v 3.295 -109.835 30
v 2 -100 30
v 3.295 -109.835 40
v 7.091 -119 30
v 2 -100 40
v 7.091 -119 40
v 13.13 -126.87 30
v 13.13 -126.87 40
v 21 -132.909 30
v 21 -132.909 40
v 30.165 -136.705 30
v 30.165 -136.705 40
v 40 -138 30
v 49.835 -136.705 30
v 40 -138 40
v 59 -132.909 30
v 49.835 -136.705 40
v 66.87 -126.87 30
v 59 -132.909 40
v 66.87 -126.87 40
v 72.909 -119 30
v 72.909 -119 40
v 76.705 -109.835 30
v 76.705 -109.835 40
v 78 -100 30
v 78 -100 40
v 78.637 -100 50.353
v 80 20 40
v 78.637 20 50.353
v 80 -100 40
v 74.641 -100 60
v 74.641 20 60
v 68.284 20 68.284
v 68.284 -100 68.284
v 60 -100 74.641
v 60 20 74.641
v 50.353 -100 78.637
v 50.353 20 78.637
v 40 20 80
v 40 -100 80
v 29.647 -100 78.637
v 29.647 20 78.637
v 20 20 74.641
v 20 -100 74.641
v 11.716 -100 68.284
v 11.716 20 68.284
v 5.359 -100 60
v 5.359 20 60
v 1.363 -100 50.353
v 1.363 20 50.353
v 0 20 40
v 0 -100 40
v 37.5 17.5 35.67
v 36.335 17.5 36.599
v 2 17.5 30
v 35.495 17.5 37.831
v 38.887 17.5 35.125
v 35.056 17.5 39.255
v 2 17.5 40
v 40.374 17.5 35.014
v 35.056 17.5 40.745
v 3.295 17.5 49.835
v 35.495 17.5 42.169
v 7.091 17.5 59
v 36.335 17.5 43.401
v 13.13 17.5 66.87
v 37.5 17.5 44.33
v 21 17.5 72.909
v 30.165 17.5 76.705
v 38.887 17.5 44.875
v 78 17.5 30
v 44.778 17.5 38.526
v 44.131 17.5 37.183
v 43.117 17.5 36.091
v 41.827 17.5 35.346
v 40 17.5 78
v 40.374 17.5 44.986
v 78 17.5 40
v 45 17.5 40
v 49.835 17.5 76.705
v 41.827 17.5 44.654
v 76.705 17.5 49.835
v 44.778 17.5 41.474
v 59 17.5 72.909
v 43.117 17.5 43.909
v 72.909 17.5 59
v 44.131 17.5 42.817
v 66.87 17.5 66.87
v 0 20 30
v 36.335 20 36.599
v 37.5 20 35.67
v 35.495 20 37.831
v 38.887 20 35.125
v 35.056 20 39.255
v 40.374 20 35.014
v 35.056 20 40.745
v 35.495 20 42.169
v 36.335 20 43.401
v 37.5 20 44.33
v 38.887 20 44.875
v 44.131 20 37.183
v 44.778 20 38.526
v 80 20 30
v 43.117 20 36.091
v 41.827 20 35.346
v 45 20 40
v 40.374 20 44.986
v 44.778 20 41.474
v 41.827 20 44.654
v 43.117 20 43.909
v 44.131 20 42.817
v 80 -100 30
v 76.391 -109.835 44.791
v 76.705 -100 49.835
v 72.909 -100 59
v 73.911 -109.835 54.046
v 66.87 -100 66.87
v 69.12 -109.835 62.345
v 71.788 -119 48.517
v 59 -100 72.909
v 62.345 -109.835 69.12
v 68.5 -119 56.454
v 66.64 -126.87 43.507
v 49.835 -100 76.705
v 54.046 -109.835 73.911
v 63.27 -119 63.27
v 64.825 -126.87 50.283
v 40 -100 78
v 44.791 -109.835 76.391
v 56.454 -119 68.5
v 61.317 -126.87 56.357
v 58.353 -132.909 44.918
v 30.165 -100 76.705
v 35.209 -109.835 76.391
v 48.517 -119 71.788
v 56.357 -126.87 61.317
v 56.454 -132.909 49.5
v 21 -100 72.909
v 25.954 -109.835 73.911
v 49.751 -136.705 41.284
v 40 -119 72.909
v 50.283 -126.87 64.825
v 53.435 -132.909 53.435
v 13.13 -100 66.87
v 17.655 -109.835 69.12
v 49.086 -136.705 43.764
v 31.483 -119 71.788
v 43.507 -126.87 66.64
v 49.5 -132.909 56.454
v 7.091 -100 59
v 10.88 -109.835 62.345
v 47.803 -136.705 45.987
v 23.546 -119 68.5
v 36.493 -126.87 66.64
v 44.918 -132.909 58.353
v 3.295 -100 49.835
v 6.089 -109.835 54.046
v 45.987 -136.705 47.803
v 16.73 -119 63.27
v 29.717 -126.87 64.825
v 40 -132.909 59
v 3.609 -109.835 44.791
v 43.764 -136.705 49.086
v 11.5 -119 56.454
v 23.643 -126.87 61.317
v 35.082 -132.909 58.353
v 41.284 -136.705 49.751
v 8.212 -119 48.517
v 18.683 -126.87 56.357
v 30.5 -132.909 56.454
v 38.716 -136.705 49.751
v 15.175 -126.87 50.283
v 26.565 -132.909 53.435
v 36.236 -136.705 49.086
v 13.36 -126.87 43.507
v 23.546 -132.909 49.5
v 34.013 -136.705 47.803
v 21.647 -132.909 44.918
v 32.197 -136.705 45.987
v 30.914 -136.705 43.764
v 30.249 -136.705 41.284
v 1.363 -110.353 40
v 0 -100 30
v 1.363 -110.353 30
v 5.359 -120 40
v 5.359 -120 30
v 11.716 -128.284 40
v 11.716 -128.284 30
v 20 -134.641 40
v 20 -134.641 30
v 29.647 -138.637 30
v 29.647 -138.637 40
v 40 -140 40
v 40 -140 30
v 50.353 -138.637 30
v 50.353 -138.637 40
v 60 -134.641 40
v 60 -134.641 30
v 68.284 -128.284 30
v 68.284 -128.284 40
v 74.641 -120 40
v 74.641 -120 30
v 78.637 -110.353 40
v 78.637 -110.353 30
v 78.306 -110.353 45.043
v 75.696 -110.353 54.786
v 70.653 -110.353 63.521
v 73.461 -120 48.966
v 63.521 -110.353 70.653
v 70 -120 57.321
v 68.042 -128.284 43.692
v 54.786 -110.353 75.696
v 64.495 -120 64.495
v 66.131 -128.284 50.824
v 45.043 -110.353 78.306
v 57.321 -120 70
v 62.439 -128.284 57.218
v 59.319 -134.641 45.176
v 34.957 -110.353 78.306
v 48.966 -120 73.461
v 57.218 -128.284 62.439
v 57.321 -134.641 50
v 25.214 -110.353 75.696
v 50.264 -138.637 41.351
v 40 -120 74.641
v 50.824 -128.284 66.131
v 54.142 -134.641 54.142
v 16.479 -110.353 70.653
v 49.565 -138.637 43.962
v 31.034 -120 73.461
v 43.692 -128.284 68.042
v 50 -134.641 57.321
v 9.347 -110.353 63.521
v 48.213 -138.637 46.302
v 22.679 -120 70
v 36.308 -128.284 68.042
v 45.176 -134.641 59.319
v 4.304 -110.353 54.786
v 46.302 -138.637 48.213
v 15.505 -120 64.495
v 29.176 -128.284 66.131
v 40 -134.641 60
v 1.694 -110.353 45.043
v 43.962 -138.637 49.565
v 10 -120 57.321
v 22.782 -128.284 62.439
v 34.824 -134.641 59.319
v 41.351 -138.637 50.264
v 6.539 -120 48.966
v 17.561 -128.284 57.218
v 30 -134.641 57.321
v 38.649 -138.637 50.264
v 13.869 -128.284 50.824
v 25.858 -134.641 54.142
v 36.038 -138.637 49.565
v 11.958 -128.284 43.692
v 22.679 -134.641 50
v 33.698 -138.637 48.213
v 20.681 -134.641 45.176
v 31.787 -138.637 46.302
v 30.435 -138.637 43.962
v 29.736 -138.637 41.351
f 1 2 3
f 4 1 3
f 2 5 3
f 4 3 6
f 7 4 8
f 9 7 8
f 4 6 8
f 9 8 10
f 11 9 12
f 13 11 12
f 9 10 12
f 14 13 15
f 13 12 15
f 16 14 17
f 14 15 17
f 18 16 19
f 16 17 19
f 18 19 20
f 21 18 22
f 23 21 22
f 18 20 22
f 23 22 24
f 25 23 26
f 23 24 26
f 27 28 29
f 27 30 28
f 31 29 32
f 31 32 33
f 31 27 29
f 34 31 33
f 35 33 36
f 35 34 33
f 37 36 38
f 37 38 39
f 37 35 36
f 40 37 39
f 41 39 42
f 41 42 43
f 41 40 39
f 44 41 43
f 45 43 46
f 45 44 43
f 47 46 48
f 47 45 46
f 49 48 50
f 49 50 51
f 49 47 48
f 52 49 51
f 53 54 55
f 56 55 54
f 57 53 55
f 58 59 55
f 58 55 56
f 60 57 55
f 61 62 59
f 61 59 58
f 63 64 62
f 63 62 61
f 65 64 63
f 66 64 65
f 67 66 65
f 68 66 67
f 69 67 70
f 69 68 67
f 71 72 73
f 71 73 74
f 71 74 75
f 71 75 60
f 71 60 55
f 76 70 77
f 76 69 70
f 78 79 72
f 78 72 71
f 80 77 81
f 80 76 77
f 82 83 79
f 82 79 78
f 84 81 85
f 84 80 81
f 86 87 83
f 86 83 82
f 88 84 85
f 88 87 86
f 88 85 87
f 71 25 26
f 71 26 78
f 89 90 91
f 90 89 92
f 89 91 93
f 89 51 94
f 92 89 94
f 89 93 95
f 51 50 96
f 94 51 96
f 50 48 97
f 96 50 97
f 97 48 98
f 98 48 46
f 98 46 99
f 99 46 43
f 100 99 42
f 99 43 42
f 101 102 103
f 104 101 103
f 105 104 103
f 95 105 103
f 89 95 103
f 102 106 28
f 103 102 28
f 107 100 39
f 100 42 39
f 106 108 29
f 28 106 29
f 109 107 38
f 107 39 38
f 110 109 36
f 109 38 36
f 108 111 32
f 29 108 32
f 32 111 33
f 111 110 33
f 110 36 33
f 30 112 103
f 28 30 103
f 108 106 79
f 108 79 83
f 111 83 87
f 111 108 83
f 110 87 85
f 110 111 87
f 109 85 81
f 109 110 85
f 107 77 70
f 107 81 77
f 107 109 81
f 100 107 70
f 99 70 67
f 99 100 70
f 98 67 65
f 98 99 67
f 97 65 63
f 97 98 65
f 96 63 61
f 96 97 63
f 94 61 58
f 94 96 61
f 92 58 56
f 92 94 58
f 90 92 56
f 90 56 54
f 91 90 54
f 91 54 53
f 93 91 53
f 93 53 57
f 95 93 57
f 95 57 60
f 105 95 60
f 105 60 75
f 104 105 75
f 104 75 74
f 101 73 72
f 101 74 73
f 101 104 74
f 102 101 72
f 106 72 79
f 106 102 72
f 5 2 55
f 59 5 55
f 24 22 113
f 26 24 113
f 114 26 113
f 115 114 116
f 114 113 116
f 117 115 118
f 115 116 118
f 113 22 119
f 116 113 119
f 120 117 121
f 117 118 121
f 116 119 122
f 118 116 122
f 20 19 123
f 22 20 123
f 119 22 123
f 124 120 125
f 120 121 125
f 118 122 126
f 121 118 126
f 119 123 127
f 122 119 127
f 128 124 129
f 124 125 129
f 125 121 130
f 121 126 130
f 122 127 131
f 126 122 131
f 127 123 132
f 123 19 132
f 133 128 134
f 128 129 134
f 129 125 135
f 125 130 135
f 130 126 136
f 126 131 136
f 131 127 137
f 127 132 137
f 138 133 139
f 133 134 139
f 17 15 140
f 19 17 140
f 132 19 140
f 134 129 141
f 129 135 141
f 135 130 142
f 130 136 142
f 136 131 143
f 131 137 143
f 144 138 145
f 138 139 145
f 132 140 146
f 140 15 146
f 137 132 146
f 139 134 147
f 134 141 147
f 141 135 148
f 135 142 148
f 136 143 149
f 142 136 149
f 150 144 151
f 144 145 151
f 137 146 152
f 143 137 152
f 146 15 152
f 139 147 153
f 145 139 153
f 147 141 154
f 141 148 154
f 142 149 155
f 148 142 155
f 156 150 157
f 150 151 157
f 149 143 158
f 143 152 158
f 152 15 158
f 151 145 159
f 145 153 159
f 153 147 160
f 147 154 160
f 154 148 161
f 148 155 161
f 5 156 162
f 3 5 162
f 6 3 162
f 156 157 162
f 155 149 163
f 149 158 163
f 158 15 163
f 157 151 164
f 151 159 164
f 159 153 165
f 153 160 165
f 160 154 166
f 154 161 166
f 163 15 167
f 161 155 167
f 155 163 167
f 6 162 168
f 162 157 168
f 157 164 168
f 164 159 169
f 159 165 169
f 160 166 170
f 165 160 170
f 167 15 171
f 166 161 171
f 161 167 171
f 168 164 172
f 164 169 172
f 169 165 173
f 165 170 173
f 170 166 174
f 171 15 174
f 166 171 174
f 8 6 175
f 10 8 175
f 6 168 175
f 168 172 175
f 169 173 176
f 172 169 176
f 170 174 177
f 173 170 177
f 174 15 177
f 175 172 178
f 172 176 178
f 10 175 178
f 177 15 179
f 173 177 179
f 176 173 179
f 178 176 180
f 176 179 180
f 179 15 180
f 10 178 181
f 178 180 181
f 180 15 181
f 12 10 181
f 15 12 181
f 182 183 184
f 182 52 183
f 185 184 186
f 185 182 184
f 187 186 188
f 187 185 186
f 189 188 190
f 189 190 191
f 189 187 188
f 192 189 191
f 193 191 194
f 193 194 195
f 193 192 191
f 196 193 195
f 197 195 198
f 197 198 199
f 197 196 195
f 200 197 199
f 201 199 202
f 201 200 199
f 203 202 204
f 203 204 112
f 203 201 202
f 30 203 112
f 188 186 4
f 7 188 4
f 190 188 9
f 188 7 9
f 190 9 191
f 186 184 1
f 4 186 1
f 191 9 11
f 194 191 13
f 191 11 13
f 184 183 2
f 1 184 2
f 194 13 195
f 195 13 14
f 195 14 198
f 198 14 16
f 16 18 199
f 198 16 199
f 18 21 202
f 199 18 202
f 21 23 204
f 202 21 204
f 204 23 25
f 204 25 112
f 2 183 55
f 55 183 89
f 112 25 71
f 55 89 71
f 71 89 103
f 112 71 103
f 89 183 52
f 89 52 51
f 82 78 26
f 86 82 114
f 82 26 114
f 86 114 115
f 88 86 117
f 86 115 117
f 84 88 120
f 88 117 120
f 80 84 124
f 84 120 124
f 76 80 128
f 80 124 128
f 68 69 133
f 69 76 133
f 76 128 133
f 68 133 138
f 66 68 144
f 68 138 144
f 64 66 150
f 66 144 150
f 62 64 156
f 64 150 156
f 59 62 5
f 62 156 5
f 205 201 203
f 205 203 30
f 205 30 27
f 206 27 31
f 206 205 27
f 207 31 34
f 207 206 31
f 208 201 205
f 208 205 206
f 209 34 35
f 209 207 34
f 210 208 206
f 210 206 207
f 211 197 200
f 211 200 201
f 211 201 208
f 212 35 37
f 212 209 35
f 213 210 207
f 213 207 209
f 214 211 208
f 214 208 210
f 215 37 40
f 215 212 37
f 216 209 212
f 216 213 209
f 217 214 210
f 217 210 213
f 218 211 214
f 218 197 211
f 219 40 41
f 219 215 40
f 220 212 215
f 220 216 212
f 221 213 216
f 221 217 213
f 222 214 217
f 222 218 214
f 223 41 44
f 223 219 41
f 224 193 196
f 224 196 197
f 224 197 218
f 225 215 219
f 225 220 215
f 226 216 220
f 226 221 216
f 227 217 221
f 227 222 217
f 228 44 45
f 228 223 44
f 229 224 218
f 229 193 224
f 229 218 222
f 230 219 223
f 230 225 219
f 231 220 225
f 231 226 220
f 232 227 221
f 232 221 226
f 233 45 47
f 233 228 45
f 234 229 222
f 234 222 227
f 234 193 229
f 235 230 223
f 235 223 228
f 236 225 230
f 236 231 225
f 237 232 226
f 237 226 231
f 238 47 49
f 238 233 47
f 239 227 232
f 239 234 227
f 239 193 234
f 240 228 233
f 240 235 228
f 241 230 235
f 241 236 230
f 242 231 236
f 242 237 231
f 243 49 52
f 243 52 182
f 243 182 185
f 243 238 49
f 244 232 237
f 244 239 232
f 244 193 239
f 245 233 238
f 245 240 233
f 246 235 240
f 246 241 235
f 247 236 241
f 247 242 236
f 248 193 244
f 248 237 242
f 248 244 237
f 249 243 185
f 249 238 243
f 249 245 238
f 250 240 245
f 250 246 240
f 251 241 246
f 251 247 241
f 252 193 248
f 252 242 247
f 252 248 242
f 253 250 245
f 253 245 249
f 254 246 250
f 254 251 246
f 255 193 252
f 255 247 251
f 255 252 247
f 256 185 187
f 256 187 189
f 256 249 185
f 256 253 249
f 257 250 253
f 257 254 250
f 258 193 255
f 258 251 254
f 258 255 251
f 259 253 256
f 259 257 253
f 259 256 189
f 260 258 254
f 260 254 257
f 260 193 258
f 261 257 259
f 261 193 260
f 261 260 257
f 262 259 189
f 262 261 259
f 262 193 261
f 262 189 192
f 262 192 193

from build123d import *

# Parameters (mm, degrees)
CYLINDER003_W     = 38
CYLINDER003_H     = 120
CYLINDER003_ANGLE = 180
CYLINDER_W        = 40
CYLINDER_H        = 120
CYLINDER_ANGLE    = 180
CYLINDER002_W     = 38
CYLINDER002_H     = 10
CYLINDER002_ANGLE = 180
CYLINDER001_W     = 40
CYLINDER001_H     = 10
CYLINDER001_ANGLE = 180
CYLINDER004_W     = 40
CYLINDER004_H     = 120
CYLINDER004_ANGLE = 180
SPHERE001_ANGLE   = 180
SPHERE_ANGLE      = 180
CYLINDER006_R     = 5
CYLINDER006_DEPTH = 17
CYLINDER005_W     = 38
CYLINDER005_H     = 2.5
CYLINDER005_ANGLE = 180
BOX_W             = 76
BOX_H             = 2.5
BOX_DEPTH         = 10
BOX002_W          = 76
BOX002_H          = 120
BOX002_DEPTH      = 10
BOX001_W          = 80
BOX001_H          = 120
BOX001_DEPTH      = 10


with BuildPart() as cilindro_superior_menor:
    # Cylinder003 → Cylinder003 (revolve)
    with BuildSketch(Plane(origin=(40, 20, 40), x_dir=(1, 0, 0), z_dir=(0, 0, -1))):
        with Locations((19, 60)):
            Rectangle(CYLINDER003_W, CYLINDER003_H)
    revolve(axis=Axis((40, 20, 40), (0, -1, 0)), revolution_arc=CYLINDER003_ANGLE)


with BuildPart() as techo:
    # Cylinder → Cylinder (revolve)
    with BuildSketch(Plane(origin=(40, 20, 40), x_dir=(1, 0, 0), z_dir=(0, 0, -1))):
        with Locations((20, 60)):
            Rectangle(CYLINDER_W, CYLINDER_H)
    revolve(axis=Axis((40, 20, 40), (0, -1, 0)), revolution_arc=CYLINDER_ANGLE)

    # Cut001: cut Cilindro superior menor
    add(cilindro_superior_menor.part, mode=Mode.SUBTRACT)


with BuildPart() as cilindro_menor:
    # Cylinder002 → Cylinder002 (revolve)
    with BuildSketch(Plane(origin=(40, -100, 30), x_dir=(-1, 0, 0), z_dir=(0, 1, 0))):
        with Locations((19, 5)):
            Rectangle(CYLINDER002_W, CYLINDER002_H)
    revolve(axis=Axis((40, -100, 30), (0, 0, 1)), revolution_arc=CYLINDER002_ANGLE)


with BuildPart() as borde_de_cupula:
    # Cylinder001 → Cylinder001 (revolve)
    with BuildSketch(Plane(origin=(40, -100, 30), x_dir=(-1, 0, 0), z_dir=(0, 1, 0))):
        with Locations((20, 5)):
            Rectangle(CYLINDER001_W, CYLINDER001_H)
    revolve(axis=Axis((40, -100, 30), (0, 0, 1)), revolution_arc=CYLINDER001_ANGLE)

    # Cut003: cut Cilindro menor
    add(cilindro_menor.part, mode=Mode.SUBTRACT)


with BuildPart() as cylinder004:
    # Cylinder004 → Cylinder004 (revolve)
    with BuildSketch(Plane(origin=(40, 20, 40), x_dir=(1, 0, 0), z_dir=(0, 0, -1))):
        with Locations((20, 60)):
            Rectangle(CYLINDER004_W, CYLINDER004_H)
    revolve(axis=Axis((40, 20, 40), (0, -1, 0)), revolution_arc=CYLINDER004_ANGLE)


with BuildPart() as esfera_menor:
    # Sphere001 → Sphere001 (revolve)
    with BuildSketch(Plane(origin=(40, -100, 40), x_dir=(1, 0, 0), z_dir=(0, 0, -1))):
        with BuildLine():
            ThreePointArc((0, -38), (38, 0), (0, 38))
            Line((0, 38), (0, -38))
        make_face()
    revolve(axis=Axis((40, -100, 40), (0, -1, 0)), revolution_arc=SPHERE001_ANGLE)


with BuildPart() as cupula_cortada:
    # Sphere → Sphere (revolve)
    with BuildSketch(Plane(origin=(40, -100, 40), x_dir=(1, 0, 0), z_dir=(0, 0, -1))):
        with BuildLine():
            ThreePointArc((0, -40), (40, 0), (0, 40))
            Line((0, 40), (0, -40))
        make_face()
    revolve(axis=Axis((40, -100, 40), (0, -1, 0)), revolution_arc=SPHERE_ANGLE)

    # Cut002: cut Esfera menor
    add(esfera_menor.part, mode=Mode.SUBTRACT)

    # Cut004: cut Cylinder004
    add(cylinder004.part, mode=Mode.SUBTRACT)


with BuildPart() as agujero:
    # Cylinder006 → Cylinder006 (new body)
    with BuildSketch(Plane(origin=(40, 24, 40), x_dir=(1, 0, 0), z_dir=(0, -1, 0))):
        Circle(CYLINDER006_R)
    extrude(amount=CYLINDER006_DEPTH)


with BuildPart() as soporte_para_superior:
    # Cylinder005 → Cylinder005 (revolve)
    with BuildSketch(Plane(origin=(40, 17.5, 40), x_dir=(-1, 0, 0), z_dir=(0, 0, -1))):
        with Locations((19, 1.25)):
            Rectangle(CYLINDER005_W, CYLINDER005_H)
    revolve(axis=Axis((40, 17.5, 40), (0, 1, 0)), revolution_arc=CYLINDER005_ANGLE)


with BuildPart() as soporte_con_agujero:
    # Box → Box (new body)
    with BuildSketch(Plane(origin=(2, 17.5, 30), x_dir=(1, 0, 0), z_dir=(0, 0, 1))):
        with Locations((38, 1.25)):
            Rectangle(BOX_W, BOX_H)
    extrude(amount=BOX_DEPTH)

    # Fusion: union Soporte para superior
    add(soporte_para_superior.part)

    # Cut005: cut Agujero
    add(agujero.part, mode=Mode.SUBTRACT)


with BuildPart() as rectangulo_menor:
    # Box002 → Box002 (new body)
    with BuildSketch(Plane(origin=(2, -100, 30), x_dir=(1, 0, 0), z_dir=(0, 0, 1))):
        with Locations((38, 60)):
            Rectangle(BOX002_W, BOX002_H)
    extrude(amount=BOX002_DEPTH)


with BuildPart() as cabeza_de_lampara_terminada:
    # Box001 → Box001 (new body)
    with BuildSketch(Plane(origin=(0, -100, 30), x_dir=(1, 0, 0), z_dir=(0, 0, 1))):
        with Locations((40, 60)):
            Rectangle(BOX001_W, BOX001_H)
    extrude(amount=BOX001_DEPTH)

    # Cut: cut Rectangulo menor
    add(rectangulo_menor.part, mode=Mode.SUBTRACT)

    # Fusion001: union Techo, Borde de cupula, Cupula cortada, Soporte con agujero
    add(techo.part)
    add(borde_de_cupula.part)
    add(cupula_cortada.part)
    add(soporte_con_agujero.part)


solid = cabeza_de_lampara_terminada.part
